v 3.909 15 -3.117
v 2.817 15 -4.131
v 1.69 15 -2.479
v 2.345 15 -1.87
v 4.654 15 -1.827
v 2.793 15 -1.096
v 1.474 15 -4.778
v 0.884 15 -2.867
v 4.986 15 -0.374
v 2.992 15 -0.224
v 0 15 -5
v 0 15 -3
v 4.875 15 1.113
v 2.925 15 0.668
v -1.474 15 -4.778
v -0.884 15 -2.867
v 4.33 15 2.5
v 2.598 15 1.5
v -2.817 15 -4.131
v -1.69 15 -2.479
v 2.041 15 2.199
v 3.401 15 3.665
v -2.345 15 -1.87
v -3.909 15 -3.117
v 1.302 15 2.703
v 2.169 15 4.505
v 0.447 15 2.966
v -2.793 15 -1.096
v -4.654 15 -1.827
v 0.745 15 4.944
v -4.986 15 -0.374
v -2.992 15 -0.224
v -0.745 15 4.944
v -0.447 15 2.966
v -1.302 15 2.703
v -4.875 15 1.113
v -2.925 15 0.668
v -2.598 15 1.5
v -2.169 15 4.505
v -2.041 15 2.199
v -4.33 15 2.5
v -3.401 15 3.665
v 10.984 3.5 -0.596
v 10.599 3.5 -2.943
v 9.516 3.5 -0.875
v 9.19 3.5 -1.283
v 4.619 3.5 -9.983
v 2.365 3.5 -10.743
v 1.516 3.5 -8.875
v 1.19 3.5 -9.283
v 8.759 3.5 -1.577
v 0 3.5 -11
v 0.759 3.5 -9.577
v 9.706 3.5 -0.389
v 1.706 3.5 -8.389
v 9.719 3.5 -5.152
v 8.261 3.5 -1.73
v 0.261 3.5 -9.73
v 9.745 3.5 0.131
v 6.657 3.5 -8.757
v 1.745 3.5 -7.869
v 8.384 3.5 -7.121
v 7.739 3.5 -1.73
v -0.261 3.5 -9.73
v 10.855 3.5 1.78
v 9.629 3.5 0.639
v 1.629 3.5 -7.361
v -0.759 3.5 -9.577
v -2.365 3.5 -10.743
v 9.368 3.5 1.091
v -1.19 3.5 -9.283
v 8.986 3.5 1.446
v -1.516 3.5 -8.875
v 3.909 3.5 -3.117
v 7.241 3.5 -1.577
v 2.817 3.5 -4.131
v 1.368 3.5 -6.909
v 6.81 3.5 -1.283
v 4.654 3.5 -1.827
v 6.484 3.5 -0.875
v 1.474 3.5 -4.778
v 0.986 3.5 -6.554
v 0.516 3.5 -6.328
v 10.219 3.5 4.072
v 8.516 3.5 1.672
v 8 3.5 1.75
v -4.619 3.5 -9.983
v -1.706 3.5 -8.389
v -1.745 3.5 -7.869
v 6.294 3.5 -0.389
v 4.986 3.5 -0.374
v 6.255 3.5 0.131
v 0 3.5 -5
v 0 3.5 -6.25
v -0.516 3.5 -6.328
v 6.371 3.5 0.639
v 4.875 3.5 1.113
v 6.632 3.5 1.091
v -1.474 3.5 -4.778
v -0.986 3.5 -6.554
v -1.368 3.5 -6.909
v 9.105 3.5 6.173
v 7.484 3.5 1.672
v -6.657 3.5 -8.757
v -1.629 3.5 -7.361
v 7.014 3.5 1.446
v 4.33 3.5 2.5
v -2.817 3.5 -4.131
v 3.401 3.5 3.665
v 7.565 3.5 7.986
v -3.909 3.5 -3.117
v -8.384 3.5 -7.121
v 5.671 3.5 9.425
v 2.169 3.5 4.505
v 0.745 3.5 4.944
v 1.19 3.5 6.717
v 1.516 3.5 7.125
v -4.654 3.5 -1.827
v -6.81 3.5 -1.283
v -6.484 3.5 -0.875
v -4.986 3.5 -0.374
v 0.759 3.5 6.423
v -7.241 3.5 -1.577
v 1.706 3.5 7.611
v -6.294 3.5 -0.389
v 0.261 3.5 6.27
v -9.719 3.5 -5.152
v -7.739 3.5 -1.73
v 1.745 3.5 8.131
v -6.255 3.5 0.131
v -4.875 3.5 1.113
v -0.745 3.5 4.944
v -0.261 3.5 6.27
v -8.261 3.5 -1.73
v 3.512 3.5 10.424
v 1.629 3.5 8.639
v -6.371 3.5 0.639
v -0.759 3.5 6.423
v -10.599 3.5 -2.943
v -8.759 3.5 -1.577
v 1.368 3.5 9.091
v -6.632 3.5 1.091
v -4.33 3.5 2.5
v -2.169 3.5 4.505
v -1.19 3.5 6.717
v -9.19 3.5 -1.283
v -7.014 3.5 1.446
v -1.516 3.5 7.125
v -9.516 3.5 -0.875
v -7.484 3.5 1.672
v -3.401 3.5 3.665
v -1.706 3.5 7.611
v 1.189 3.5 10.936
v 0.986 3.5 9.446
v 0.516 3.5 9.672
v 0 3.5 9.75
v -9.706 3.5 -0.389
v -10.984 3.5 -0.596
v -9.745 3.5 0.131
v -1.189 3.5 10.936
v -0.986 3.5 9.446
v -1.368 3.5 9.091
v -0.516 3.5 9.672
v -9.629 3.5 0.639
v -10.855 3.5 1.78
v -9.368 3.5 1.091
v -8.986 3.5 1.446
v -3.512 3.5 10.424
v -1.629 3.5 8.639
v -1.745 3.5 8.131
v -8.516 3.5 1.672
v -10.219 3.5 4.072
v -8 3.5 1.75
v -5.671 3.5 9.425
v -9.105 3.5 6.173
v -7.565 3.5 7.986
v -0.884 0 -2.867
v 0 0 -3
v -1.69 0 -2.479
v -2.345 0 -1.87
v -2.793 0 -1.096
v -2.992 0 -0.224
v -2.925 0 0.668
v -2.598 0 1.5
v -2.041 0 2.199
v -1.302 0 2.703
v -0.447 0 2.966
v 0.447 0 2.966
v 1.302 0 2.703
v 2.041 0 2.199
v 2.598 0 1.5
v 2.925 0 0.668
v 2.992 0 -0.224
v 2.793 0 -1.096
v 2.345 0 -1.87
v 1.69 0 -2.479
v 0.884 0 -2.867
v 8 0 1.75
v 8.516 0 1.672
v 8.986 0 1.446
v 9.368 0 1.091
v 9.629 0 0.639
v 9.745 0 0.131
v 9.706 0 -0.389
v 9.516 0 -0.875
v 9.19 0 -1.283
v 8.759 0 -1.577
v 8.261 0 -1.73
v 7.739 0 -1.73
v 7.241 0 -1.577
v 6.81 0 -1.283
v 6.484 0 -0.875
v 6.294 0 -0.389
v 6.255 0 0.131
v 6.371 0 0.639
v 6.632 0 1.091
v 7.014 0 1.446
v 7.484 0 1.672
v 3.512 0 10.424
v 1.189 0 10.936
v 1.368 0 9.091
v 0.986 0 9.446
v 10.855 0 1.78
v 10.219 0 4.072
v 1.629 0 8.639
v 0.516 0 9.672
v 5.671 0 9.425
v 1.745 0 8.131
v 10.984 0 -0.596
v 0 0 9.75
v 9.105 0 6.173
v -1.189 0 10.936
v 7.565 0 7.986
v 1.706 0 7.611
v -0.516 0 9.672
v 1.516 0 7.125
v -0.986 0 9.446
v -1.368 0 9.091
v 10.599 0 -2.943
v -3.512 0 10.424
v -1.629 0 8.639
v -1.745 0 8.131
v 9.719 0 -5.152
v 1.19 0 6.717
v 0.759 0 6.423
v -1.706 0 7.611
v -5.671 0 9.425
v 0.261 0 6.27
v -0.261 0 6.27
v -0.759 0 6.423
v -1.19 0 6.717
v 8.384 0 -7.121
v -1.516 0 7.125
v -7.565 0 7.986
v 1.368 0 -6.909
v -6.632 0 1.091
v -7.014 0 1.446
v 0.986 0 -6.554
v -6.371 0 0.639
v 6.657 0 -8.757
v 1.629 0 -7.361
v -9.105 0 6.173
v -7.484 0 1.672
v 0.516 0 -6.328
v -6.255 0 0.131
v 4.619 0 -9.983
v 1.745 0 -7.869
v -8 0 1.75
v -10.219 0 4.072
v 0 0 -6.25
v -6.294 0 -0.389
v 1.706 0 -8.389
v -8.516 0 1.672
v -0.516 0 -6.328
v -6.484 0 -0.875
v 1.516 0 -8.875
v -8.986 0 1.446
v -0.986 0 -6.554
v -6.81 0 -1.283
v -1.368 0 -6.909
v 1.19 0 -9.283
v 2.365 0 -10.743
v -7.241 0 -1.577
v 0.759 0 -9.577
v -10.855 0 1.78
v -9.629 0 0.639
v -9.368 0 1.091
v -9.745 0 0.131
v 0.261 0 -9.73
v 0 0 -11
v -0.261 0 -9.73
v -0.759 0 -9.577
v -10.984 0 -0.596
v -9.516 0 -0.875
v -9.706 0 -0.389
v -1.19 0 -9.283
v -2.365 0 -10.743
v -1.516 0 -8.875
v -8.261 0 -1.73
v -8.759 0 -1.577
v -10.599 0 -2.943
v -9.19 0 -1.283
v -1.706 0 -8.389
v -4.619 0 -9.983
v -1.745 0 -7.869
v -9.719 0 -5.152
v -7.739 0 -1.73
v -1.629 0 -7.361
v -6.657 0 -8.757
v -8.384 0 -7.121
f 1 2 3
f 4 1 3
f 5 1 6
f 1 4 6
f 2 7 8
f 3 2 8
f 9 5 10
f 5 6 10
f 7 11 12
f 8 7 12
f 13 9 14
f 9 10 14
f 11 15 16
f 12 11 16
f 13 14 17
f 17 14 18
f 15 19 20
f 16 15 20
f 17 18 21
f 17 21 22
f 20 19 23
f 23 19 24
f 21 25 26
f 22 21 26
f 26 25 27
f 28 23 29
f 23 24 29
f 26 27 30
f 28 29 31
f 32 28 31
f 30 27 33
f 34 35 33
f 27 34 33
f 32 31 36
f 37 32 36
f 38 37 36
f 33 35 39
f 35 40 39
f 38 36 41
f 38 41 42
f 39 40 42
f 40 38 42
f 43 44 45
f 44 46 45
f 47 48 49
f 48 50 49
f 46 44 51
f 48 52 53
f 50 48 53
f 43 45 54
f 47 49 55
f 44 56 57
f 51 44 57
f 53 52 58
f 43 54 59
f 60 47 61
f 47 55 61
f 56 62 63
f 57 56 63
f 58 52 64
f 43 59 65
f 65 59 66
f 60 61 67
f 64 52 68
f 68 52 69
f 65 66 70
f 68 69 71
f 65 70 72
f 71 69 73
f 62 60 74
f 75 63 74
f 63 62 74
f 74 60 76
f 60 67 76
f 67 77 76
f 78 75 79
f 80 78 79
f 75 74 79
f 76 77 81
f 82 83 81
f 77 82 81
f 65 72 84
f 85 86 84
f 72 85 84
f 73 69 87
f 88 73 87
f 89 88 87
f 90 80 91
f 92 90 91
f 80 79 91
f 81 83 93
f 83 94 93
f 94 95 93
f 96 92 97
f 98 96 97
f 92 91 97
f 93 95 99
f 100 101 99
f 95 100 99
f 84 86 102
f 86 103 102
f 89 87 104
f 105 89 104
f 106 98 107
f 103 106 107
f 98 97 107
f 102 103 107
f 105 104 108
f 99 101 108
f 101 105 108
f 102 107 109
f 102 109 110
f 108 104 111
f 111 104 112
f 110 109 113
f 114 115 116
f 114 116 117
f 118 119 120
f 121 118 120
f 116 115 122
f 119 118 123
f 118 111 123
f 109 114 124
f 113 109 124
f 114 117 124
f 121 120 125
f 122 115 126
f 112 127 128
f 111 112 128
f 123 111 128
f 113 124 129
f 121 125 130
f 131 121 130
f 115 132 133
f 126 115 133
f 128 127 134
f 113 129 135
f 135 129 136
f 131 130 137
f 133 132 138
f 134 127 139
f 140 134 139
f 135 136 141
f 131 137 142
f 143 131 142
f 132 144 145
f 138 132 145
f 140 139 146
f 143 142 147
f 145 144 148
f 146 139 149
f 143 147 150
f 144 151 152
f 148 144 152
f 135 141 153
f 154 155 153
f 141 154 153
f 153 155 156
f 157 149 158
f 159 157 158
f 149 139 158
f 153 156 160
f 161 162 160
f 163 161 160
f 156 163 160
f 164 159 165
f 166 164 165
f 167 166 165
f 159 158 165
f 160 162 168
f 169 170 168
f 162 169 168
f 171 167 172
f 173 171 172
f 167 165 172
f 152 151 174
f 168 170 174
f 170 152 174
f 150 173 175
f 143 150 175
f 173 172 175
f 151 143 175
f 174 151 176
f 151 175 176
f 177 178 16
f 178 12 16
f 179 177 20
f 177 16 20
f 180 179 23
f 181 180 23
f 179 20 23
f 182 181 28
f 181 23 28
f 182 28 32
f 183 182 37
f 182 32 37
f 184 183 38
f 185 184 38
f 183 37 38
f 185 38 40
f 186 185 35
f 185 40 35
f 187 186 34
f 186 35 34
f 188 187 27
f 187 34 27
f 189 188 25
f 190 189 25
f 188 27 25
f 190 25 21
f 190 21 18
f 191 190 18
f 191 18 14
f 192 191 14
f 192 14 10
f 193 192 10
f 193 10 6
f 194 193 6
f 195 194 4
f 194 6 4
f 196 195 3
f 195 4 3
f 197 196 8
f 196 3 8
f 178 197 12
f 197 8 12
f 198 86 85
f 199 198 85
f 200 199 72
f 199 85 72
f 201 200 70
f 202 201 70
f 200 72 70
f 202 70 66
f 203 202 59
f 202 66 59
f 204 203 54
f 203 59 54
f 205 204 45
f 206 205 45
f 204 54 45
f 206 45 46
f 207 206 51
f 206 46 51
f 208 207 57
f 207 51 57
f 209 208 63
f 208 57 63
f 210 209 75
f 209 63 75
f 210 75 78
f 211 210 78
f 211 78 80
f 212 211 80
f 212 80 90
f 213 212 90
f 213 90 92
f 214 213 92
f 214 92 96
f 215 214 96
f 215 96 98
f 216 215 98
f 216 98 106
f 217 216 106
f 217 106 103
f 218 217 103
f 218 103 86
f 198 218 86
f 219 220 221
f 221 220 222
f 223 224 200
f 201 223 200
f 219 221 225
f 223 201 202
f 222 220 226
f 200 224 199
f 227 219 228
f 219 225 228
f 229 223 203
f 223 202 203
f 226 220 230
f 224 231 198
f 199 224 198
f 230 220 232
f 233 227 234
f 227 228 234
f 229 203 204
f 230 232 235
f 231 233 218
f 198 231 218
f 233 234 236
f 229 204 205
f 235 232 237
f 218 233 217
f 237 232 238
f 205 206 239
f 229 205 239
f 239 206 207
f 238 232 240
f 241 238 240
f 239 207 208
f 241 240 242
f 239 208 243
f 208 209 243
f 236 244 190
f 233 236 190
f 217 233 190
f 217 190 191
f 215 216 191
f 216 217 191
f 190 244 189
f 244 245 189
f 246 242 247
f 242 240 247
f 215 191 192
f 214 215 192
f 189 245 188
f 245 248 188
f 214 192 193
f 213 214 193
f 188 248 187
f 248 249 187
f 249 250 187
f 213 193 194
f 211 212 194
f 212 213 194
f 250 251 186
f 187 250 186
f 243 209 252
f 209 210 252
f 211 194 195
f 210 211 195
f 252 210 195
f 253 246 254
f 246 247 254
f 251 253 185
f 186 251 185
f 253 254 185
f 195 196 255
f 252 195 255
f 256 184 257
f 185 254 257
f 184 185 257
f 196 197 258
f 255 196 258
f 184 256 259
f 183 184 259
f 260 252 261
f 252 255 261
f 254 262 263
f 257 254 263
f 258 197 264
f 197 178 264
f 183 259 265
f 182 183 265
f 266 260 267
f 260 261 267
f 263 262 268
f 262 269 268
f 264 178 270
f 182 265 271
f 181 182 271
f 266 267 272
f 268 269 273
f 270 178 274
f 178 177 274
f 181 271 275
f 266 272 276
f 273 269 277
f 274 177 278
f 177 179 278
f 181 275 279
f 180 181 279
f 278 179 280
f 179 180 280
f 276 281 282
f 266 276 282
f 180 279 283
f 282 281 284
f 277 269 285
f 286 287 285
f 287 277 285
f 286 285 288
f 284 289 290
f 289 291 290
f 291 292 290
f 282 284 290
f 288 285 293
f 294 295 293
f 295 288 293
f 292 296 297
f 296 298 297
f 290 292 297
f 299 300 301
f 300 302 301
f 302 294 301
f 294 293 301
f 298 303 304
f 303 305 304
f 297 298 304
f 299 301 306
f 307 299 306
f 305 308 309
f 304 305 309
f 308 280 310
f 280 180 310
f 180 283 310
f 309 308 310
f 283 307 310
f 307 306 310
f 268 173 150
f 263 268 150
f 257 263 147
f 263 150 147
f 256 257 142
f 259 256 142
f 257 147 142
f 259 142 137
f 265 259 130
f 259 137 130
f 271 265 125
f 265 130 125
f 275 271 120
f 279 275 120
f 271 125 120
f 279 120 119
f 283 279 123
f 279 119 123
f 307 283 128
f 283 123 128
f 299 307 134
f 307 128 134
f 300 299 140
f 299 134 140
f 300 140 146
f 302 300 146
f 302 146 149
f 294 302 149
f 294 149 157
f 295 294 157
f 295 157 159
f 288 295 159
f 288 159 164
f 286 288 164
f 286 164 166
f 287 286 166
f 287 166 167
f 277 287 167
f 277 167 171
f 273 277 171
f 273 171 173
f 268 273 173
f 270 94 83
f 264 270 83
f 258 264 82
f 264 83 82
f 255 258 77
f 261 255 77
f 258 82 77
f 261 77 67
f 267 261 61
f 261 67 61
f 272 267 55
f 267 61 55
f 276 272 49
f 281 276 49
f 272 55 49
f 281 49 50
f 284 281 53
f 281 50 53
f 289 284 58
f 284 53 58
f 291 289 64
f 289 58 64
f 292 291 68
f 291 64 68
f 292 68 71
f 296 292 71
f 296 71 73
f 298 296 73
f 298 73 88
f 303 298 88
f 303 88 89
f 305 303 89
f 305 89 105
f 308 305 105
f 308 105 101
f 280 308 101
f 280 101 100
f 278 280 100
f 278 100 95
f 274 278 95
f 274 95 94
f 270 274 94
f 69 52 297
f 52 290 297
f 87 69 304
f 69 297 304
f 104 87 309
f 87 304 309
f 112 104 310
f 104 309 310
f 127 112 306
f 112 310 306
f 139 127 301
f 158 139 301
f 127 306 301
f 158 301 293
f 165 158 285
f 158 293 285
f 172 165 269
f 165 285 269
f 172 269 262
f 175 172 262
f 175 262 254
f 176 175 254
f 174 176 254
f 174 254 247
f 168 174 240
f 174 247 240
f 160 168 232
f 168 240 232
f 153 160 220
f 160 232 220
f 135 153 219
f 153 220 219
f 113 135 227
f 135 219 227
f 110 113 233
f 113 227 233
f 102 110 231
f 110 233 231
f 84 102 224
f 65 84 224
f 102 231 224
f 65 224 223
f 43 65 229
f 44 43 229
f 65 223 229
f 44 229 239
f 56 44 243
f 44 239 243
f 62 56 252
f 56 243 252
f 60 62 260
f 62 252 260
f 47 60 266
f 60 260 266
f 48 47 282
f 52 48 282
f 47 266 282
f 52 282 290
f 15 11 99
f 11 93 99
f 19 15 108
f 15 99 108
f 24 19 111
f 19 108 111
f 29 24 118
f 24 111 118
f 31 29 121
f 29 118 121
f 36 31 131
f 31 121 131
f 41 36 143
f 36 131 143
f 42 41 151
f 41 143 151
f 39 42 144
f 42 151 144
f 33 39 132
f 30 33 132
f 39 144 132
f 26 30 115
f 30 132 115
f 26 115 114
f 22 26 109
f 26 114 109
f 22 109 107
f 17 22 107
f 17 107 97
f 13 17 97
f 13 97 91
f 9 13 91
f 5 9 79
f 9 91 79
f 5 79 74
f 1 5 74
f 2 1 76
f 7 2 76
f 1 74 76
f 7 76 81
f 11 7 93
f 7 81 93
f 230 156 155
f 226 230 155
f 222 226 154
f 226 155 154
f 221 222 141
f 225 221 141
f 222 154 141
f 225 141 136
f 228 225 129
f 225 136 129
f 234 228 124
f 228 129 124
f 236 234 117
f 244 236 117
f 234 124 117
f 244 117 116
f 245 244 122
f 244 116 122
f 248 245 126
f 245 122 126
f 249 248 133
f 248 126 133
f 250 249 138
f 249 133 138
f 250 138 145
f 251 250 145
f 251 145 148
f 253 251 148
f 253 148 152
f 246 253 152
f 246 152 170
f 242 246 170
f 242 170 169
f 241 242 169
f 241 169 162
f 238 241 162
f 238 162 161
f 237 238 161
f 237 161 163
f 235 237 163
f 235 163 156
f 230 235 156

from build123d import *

# Parameters (mm, degrees)
SKETCH2_R          = 1.75
CUT_EXTRUDE1_DEPTH = 10


with BuildPart() as part:
    # Sketch1 → Revolve1 (revolve)
    with BuildSketch(Plane.XY, mode=Mode.PRIVATE) as revolve1_sk:
        Polygon((-5, 15), (-5, 3.5), (-11, 3.5), (-11, 0), (-3, 0), (-3, 15), align=None)
    revolve(revolve1_sk.sketch.rotate(Axis((0, 0, 0), (0, 1, 0)), 270), axis=Axis((0, 0, 0), (0, 1, 0)))

    # Sketch2 → Cut-Extrude1 (cut)
    with BuildSketch(Plane(origin=(0, 3.5, 0), x_dir=(1, 0, 0), z_dir=(0, 1, 0))):
        with Locations(Location((0, 8, 0), (0, 0, 270))):
            Circle(SKETCH2_R)
        with Locations(Location((8, 0, 0), (0, 0, 270))):
            Circle(SKETCH2_R)
        with Locations(Location((0, -8, 0), (0, 0, 270))):
            Circle(SKETCH2_R)
        with Locations(Location((-8, 0, 0), (0, 0, 270))):
            Circle(SKETCH2_R)
    extrude(amount=-CUT_EXTRUDE1_DEPTH, mode=Mode.SUBTRACT)


solid = part.part
